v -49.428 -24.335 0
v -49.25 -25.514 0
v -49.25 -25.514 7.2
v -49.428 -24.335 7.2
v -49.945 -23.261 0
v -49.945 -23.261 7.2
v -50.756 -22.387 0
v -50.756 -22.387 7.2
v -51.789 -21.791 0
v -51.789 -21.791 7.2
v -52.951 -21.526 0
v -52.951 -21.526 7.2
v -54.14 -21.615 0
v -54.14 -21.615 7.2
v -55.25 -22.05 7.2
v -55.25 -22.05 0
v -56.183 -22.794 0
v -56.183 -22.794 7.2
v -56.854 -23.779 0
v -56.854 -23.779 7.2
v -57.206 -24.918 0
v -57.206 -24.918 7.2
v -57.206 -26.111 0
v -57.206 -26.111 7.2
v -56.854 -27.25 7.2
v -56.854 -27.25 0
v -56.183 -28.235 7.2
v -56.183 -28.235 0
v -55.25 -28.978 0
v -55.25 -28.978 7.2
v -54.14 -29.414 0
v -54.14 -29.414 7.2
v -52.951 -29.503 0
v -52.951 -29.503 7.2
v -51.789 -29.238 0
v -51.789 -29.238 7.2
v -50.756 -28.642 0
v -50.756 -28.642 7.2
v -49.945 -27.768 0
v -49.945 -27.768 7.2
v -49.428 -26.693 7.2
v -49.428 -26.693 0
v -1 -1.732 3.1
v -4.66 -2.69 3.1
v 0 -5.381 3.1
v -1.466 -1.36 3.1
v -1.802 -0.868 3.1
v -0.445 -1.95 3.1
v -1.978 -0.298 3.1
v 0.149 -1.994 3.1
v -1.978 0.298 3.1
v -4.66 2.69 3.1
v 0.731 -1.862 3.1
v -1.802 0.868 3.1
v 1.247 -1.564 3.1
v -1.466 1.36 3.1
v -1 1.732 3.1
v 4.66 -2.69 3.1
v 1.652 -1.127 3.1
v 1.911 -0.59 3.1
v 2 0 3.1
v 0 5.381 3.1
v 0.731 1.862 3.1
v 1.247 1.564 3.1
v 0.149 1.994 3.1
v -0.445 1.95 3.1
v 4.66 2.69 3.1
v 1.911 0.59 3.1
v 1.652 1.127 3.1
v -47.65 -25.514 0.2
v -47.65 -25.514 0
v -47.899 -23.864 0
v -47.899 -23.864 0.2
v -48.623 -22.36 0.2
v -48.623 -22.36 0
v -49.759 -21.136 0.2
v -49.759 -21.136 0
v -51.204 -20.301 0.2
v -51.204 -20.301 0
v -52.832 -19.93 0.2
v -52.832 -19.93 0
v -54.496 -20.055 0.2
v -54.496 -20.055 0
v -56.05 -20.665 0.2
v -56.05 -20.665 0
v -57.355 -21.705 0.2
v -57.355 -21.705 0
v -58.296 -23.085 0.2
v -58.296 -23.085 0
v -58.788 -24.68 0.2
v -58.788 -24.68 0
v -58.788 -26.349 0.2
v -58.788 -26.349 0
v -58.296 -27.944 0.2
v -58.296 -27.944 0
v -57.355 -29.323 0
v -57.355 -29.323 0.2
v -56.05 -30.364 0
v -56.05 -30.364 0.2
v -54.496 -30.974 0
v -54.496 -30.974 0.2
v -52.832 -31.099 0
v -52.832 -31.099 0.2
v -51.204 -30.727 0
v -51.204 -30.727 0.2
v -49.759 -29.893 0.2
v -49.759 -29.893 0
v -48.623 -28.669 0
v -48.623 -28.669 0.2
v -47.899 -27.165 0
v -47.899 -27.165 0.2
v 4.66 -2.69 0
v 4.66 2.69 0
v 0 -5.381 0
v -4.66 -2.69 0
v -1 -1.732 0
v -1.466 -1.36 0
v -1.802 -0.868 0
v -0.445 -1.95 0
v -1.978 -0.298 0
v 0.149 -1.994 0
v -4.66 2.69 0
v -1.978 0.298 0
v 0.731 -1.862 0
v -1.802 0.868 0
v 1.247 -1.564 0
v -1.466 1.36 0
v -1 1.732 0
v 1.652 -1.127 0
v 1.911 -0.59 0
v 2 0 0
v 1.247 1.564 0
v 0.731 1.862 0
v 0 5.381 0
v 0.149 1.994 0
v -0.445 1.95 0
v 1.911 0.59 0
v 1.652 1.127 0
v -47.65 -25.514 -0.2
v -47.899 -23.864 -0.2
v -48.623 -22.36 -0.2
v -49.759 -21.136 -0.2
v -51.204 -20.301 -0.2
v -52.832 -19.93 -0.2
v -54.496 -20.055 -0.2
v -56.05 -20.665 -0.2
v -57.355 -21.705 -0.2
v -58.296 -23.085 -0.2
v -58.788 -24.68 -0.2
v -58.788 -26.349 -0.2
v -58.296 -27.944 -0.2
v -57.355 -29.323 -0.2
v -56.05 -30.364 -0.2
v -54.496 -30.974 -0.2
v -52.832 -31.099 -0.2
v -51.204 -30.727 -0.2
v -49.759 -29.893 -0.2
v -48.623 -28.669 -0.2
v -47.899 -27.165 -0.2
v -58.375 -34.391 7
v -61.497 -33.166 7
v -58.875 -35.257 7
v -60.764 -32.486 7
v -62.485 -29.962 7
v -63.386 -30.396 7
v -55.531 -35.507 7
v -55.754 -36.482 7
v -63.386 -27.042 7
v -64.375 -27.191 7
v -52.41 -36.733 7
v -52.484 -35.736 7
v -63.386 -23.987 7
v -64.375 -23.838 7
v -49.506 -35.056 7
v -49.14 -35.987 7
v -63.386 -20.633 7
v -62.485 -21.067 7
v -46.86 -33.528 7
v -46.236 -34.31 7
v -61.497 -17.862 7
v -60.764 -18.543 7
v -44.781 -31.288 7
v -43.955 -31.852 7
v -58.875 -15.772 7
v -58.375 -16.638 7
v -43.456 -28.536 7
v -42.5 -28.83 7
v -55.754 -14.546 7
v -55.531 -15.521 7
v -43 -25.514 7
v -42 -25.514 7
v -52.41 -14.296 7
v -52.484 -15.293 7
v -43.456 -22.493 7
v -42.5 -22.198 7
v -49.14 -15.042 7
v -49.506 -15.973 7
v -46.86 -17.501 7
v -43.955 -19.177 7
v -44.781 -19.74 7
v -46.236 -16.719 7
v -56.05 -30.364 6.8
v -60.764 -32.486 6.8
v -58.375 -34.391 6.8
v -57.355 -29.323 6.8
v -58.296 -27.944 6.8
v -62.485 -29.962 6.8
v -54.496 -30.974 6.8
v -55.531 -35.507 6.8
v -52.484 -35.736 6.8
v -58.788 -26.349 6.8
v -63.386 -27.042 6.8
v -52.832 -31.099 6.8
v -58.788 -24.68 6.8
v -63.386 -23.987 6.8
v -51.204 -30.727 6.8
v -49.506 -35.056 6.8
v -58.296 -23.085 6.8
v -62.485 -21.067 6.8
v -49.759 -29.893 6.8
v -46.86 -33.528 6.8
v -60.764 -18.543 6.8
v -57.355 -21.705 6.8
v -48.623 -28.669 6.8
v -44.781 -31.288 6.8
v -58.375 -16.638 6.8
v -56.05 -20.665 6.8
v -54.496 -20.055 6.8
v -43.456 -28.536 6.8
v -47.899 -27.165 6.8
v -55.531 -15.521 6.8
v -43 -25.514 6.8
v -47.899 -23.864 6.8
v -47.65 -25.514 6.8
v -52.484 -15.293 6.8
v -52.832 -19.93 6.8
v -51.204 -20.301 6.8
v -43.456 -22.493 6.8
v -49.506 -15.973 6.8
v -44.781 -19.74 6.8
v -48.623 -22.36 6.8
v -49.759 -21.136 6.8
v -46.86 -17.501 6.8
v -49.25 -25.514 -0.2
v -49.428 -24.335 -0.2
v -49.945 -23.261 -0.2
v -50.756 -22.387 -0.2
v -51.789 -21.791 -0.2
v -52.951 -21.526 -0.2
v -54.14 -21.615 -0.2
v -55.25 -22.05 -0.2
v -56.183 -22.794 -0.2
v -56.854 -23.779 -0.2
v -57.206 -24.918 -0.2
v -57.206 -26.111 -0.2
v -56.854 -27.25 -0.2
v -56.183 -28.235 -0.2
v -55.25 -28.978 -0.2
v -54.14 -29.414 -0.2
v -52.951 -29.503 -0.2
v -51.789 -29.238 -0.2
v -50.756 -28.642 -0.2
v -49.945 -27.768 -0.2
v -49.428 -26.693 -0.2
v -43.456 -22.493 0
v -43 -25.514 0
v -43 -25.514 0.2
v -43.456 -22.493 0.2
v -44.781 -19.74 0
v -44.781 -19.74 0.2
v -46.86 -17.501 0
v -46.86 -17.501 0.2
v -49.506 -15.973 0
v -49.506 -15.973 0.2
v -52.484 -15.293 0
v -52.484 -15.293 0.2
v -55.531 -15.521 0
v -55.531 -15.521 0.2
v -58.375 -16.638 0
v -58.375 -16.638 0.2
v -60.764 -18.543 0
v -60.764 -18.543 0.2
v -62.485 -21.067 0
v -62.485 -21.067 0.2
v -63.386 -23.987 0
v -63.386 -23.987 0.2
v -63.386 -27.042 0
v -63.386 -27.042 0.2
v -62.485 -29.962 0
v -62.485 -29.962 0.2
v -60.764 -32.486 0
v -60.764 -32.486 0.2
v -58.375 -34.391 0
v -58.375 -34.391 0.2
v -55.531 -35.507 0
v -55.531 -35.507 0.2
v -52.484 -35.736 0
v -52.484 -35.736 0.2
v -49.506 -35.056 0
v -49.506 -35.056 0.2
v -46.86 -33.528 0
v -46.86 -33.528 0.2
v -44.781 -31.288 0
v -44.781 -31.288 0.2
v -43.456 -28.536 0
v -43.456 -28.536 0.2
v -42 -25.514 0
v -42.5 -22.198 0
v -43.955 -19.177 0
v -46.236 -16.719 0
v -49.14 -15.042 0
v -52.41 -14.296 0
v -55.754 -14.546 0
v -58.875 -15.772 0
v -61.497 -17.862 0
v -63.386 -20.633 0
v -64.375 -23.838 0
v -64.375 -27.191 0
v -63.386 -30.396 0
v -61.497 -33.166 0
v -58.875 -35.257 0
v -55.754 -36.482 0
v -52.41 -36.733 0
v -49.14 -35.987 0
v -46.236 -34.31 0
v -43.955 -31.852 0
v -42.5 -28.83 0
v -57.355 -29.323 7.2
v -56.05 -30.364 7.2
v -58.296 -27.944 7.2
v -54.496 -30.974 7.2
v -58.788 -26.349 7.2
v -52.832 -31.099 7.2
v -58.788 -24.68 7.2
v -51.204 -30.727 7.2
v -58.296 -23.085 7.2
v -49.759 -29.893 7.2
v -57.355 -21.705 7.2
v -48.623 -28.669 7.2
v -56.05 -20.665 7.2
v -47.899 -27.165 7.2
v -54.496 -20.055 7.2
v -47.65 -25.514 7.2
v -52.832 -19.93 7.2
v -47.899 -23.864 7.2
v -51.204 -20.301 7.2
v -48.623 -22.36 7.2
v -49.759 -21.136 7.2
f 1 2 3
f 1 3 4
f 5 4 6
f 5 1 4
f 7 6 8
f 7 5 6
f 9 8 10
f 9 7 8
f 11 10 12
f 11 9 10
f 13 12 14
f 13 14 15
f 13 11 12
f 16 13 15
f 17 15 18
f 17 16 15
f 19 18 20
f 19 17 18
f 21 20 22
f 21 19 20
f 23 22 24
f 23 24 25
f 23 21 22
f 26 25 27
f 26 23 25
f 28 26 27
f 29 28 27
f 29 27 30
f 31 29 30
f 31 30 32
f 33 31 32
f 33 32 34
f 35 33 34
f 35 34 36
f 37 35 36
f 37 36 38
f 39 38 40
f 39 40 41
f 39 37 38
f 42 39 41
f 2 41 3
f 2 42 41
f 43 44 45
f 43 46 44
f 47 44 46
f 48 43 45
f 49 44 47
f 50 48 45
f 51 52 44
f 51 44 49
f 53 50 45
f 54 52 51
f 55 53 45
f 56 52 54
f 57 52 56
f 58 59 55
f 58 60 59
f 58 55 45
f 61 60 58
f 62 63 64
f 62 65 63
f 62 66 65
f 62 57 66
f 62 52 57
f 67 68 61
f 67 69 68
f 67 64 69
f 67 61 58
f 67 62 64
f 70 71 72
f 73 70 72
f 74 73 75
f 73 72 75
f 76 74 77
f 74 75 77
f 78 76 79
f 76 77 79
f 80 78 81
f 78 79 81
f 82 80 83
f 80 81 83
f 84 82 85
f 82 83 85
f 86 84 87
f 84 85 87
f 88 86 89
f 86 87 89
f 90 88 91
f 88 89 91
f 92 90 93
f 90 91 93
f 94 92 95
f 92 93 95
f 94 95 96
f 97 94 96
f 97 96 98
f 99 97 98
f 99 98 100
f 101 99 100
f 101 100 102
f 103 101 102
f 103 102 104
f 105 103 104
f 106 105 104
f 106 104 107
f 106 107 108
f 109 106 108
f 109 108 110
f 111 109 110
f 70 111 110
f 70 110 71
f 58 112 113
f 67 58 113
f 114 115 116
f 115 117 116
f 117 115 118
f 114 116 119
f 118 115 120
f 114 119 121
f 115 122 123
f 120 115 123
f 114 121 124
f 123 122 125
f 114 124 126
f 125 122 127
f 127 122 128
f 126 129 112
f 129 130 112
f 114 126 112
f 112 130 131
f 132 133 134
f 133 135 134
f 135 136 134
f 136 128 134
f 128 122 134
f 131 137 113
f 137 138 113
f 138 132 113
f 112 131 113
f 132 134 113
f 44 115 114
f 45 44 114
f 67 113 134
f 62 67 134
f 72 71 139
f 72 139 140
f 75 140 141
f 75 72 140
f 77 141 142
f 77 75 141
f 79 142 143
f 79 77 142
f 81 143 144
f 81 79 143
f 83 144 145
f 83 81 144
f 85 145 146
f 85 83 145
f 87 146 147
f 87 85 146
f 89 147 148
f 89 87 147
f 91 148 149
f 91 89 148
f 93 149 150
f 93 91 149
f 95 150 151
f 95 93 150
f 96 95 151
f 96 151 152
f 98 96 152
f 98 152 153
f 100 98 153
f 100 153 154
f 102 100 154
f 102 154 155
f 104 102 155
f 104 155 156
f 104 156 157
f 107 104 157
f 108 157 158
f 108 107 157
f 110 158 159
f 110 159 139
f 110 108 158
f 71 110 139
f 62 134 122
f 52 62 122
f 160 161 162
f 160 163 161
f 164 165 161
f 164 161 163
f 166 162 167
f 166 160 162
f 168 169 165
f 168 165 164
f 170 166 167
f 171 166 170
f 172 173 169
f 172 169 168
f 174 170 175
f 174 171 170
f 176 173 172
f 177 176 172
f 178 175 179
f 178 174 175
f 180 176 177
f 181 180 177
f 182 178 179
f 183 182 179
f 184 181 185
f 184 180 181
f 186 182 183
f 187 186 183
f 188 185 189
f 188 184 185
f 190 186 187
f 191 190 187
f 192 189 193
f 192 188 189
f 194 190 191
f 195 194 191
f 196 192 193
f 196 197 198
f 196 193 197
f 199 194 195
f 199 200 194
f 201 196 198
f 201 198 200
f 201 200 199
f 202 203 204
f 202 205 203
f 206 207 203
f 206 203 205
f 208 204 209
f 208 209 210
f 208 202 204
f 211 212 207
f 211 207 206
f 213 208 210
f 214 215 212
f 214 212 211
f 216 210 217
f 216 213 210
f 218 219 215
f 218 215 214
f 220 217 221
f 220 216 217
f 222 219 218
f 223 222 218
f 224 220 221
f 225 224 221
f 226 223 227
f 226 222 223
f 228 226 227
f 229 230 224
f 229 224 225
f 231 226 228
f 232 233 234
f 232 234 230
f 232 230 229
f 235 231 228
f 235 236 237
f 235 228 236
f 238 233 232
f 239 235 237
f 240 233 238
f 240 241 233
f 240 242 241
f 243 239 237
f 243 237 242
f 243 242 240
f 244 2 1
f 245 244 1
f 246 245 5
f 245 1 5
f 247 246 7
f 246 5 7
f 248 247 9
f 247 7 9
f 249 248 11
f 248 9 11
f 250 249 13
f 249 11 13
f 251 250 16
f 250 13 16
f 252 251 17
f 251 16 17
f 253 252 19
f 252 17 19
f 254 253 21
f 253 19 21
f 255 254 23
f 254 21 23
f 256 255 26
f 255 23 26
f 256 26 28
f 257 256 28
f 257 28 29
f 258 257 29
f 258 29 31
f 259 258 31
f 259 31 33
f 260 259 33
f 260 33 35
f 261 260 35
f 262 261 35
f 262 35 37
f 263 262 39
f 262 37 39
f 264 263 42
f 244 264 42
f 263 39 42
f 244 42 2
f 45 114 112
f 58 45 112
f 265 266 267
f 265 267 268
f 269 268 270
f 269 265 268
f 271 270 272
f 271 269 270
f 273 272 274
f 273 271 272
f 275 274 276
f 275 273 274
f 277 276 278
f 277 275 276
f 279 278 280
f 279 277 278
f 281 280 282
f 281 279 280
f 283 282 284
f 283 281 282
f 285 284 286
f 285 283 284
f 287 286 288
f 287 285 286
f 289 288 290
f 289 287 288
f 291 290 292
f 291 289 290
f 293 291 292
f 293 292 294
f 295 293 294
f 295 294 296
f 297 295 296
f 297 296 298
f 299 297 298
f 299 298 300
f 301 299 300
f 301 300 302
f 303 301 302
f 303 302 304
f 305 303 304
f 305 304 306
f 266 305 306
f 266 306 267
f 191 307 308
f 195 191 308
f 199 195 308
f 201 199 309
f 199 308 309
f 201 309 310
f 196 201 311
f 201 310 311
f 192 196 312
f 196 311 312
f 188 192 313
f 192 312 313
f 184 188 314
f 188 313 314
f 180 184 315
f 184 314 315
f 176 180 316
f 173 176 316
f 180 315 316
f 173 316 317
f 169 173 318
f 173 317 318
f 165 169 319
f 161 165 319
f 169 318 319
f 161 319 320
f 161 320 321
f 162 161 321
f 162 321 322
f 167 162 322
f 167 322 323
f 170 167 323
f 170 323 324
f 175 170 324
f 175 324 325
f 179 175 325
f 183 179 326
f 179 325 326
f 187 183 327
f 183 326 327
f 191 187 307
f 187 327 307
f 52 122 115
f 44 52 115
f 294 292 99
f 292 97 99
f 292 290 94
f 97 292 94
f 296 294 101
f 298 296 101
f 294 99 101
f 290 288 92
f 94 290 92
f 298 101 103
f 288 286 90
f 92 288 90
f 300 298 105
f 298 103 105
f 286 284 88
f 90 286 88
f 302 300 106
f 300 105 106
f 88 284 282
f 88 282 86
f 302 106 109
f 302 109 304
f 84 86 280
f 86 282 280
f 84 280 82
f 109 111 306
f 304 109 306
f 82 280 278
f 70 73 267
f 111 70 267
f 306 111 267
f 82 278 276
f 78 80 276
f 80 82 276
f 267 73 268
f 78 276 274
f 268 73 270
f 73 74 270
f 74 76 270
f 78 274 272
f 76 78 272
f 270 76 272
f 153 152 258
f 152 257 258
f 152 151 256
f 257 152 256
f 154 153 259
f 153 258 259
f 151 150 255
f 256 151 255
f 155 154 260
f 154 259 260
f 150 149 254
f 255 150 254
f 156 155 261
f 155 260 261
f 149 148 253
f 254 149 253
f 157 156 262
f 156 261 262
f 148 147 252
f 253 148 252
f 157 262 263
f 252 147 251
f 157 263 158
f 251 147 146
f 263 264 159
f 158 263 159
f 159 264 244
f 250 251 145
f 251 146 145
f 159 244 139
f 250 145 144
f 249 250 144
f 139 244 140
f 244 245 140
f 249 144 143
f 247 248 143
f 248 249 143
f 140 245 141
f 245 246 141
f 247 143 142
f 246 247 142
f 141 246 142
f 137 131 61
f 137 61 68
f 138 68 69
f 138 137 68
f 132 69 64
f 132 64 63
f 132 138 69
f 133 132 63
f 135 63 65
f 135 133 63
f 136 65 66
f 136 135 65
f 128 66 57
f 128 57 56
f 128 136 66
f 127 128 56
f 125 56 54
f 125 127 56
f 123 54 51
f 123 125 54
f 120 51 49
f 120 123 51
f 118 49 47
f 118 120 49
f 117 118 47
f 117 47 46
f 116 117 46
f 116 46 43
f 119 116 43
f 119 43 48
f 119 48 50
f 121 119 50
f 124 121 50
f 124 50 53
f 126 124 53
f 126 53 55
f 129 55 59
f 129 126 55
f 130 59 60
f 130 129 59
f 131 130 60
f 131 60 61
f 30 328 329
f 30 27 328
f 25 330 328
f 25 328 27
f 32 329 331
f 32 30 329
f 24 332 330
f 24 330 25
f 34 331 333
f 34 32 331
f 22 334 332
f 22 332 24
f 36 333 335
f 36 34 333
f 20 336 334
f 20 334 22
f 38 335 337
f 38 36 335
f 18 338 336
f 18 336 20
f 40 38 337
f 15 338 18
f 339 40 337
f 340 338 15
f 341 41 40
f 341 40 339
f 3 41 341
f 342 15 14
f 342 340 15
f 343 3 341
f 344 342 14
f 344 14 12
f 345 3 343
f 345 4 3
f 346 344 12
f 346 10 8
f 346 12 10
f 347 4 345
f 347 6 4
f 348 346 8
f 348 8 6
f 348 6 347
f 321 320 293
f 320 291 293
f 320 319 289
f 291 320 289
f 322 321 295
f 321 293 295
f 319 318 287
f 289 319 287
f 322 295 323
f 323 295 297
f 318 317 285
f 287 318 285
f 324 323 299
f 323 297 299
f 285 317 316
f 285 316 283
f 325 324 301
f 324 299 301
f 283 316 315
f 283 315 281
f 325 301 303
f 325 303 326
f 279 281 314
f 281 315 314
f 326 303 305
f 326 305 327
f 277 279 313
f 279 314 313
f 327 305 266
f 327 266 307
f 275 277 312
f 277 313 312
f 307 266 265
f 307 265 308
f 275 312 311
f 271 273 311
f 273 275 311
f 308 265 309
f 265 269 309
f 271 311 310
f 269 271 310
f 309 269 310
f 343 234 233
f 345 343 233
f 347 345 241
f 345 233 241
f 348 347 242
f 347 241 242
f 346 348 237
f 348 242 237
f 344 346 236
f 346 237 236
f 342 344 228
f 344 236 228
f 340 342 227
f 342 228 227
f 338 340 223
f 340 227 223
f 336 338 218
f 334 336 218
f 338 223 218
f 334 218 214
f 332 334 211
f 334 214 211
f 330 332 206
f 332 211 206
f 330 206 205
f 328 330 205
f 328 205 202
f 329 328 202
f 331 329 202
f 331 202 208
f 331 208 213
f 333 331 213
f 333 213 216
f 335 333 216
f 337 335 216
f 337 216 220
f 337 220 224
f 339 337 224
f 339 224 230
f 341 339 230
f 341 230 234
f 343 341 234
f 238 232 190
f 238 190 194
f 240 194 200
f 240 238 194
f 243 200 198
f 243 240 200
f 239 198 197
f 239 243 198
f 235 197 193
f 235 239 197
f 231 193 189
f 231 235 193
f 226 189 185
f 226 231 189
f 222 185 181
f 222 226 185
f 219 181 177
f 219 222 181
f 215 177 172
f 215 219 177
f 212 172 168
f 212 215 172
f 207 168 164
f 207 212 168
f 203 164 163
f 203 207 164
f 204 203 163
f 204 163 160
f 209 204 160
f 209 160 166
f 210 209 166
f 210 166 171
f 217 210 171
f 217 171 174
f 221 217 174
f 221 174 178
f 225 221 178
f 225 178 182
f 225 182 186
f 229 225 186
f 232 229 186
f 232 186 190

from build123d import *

# Parameters (mm, degrees)
F0_R          = 2
F1_DEPTH      = 3.1
F2_R          = 11.25
F2_R_2        = 10.25
F3_DEPTH      = 7
F4_START      = 0.2
F2_R_3        = 5.6
F4_DEPTH      = 6.6
F2_R_4        = 4
F5_DEPTH      = 7.2
F5_DEPTH_BACK = 0.2


with BuildPart() as f1:
    # F0 (on Top) → F1 (new body)
    with BuildSketch(Plane.XY):
        Polygon((4.66, -2.6904522544), (4.66, 2.6904522544), (0, 5.3809045088), (-4.66, 2.6904522544), (-4.66, -2.6904522544), (0, -5.3809045088), align=None)
        Circle(F0_R, mode=Mode.SUBTRACT)
    extrude(amount=F1_DEPTH)


with BuildPart() as f3:
    # F2 (on Top) → F3 (new body)
    with BuildSketch(Plane.XY):
        with Locations((-53.2503739734, -25.5143474787)):
            Circle(F2_R)
        with Locations((-53.2503739734, -25.5143474787)):
            Circle(F2_R_2, mode=Mode.SUBTRACT)
    extrude(amount=F3_DEPTH)

    # F2 (on Top) → F4 (join)
    with BuildSketch(Plane.XY.offset(F4_START)):
        with Locations((-53.2503739734, -25.5143474787)):
            Circle(F2_R_2)
        with Locations((-53.2503739734, -25.5143474787)):
            Circle(F2_R_3, mode=Mode.SUBTRACT)
    extrude(amount=F4_DEPTH)

    # F2 (on Top) → F5 (join, two sides)
    with BuildSketch(Plane.XY) as f5_sk:
        with Locations((-53.2503739734, -25.5143474787)):
            Circle(F2_R_3)
        with Locations((-53.2503739734, -25.5143474787)):
            Circle(F2_R_4, mode=Mode.SUBTRACT)
    extrude(amount=F5_DEPTH)
    extrude(f5_sk.sketch, amount=-F5_DEPTH_BACK)


solid = Compound([f1.part, f3.part])
